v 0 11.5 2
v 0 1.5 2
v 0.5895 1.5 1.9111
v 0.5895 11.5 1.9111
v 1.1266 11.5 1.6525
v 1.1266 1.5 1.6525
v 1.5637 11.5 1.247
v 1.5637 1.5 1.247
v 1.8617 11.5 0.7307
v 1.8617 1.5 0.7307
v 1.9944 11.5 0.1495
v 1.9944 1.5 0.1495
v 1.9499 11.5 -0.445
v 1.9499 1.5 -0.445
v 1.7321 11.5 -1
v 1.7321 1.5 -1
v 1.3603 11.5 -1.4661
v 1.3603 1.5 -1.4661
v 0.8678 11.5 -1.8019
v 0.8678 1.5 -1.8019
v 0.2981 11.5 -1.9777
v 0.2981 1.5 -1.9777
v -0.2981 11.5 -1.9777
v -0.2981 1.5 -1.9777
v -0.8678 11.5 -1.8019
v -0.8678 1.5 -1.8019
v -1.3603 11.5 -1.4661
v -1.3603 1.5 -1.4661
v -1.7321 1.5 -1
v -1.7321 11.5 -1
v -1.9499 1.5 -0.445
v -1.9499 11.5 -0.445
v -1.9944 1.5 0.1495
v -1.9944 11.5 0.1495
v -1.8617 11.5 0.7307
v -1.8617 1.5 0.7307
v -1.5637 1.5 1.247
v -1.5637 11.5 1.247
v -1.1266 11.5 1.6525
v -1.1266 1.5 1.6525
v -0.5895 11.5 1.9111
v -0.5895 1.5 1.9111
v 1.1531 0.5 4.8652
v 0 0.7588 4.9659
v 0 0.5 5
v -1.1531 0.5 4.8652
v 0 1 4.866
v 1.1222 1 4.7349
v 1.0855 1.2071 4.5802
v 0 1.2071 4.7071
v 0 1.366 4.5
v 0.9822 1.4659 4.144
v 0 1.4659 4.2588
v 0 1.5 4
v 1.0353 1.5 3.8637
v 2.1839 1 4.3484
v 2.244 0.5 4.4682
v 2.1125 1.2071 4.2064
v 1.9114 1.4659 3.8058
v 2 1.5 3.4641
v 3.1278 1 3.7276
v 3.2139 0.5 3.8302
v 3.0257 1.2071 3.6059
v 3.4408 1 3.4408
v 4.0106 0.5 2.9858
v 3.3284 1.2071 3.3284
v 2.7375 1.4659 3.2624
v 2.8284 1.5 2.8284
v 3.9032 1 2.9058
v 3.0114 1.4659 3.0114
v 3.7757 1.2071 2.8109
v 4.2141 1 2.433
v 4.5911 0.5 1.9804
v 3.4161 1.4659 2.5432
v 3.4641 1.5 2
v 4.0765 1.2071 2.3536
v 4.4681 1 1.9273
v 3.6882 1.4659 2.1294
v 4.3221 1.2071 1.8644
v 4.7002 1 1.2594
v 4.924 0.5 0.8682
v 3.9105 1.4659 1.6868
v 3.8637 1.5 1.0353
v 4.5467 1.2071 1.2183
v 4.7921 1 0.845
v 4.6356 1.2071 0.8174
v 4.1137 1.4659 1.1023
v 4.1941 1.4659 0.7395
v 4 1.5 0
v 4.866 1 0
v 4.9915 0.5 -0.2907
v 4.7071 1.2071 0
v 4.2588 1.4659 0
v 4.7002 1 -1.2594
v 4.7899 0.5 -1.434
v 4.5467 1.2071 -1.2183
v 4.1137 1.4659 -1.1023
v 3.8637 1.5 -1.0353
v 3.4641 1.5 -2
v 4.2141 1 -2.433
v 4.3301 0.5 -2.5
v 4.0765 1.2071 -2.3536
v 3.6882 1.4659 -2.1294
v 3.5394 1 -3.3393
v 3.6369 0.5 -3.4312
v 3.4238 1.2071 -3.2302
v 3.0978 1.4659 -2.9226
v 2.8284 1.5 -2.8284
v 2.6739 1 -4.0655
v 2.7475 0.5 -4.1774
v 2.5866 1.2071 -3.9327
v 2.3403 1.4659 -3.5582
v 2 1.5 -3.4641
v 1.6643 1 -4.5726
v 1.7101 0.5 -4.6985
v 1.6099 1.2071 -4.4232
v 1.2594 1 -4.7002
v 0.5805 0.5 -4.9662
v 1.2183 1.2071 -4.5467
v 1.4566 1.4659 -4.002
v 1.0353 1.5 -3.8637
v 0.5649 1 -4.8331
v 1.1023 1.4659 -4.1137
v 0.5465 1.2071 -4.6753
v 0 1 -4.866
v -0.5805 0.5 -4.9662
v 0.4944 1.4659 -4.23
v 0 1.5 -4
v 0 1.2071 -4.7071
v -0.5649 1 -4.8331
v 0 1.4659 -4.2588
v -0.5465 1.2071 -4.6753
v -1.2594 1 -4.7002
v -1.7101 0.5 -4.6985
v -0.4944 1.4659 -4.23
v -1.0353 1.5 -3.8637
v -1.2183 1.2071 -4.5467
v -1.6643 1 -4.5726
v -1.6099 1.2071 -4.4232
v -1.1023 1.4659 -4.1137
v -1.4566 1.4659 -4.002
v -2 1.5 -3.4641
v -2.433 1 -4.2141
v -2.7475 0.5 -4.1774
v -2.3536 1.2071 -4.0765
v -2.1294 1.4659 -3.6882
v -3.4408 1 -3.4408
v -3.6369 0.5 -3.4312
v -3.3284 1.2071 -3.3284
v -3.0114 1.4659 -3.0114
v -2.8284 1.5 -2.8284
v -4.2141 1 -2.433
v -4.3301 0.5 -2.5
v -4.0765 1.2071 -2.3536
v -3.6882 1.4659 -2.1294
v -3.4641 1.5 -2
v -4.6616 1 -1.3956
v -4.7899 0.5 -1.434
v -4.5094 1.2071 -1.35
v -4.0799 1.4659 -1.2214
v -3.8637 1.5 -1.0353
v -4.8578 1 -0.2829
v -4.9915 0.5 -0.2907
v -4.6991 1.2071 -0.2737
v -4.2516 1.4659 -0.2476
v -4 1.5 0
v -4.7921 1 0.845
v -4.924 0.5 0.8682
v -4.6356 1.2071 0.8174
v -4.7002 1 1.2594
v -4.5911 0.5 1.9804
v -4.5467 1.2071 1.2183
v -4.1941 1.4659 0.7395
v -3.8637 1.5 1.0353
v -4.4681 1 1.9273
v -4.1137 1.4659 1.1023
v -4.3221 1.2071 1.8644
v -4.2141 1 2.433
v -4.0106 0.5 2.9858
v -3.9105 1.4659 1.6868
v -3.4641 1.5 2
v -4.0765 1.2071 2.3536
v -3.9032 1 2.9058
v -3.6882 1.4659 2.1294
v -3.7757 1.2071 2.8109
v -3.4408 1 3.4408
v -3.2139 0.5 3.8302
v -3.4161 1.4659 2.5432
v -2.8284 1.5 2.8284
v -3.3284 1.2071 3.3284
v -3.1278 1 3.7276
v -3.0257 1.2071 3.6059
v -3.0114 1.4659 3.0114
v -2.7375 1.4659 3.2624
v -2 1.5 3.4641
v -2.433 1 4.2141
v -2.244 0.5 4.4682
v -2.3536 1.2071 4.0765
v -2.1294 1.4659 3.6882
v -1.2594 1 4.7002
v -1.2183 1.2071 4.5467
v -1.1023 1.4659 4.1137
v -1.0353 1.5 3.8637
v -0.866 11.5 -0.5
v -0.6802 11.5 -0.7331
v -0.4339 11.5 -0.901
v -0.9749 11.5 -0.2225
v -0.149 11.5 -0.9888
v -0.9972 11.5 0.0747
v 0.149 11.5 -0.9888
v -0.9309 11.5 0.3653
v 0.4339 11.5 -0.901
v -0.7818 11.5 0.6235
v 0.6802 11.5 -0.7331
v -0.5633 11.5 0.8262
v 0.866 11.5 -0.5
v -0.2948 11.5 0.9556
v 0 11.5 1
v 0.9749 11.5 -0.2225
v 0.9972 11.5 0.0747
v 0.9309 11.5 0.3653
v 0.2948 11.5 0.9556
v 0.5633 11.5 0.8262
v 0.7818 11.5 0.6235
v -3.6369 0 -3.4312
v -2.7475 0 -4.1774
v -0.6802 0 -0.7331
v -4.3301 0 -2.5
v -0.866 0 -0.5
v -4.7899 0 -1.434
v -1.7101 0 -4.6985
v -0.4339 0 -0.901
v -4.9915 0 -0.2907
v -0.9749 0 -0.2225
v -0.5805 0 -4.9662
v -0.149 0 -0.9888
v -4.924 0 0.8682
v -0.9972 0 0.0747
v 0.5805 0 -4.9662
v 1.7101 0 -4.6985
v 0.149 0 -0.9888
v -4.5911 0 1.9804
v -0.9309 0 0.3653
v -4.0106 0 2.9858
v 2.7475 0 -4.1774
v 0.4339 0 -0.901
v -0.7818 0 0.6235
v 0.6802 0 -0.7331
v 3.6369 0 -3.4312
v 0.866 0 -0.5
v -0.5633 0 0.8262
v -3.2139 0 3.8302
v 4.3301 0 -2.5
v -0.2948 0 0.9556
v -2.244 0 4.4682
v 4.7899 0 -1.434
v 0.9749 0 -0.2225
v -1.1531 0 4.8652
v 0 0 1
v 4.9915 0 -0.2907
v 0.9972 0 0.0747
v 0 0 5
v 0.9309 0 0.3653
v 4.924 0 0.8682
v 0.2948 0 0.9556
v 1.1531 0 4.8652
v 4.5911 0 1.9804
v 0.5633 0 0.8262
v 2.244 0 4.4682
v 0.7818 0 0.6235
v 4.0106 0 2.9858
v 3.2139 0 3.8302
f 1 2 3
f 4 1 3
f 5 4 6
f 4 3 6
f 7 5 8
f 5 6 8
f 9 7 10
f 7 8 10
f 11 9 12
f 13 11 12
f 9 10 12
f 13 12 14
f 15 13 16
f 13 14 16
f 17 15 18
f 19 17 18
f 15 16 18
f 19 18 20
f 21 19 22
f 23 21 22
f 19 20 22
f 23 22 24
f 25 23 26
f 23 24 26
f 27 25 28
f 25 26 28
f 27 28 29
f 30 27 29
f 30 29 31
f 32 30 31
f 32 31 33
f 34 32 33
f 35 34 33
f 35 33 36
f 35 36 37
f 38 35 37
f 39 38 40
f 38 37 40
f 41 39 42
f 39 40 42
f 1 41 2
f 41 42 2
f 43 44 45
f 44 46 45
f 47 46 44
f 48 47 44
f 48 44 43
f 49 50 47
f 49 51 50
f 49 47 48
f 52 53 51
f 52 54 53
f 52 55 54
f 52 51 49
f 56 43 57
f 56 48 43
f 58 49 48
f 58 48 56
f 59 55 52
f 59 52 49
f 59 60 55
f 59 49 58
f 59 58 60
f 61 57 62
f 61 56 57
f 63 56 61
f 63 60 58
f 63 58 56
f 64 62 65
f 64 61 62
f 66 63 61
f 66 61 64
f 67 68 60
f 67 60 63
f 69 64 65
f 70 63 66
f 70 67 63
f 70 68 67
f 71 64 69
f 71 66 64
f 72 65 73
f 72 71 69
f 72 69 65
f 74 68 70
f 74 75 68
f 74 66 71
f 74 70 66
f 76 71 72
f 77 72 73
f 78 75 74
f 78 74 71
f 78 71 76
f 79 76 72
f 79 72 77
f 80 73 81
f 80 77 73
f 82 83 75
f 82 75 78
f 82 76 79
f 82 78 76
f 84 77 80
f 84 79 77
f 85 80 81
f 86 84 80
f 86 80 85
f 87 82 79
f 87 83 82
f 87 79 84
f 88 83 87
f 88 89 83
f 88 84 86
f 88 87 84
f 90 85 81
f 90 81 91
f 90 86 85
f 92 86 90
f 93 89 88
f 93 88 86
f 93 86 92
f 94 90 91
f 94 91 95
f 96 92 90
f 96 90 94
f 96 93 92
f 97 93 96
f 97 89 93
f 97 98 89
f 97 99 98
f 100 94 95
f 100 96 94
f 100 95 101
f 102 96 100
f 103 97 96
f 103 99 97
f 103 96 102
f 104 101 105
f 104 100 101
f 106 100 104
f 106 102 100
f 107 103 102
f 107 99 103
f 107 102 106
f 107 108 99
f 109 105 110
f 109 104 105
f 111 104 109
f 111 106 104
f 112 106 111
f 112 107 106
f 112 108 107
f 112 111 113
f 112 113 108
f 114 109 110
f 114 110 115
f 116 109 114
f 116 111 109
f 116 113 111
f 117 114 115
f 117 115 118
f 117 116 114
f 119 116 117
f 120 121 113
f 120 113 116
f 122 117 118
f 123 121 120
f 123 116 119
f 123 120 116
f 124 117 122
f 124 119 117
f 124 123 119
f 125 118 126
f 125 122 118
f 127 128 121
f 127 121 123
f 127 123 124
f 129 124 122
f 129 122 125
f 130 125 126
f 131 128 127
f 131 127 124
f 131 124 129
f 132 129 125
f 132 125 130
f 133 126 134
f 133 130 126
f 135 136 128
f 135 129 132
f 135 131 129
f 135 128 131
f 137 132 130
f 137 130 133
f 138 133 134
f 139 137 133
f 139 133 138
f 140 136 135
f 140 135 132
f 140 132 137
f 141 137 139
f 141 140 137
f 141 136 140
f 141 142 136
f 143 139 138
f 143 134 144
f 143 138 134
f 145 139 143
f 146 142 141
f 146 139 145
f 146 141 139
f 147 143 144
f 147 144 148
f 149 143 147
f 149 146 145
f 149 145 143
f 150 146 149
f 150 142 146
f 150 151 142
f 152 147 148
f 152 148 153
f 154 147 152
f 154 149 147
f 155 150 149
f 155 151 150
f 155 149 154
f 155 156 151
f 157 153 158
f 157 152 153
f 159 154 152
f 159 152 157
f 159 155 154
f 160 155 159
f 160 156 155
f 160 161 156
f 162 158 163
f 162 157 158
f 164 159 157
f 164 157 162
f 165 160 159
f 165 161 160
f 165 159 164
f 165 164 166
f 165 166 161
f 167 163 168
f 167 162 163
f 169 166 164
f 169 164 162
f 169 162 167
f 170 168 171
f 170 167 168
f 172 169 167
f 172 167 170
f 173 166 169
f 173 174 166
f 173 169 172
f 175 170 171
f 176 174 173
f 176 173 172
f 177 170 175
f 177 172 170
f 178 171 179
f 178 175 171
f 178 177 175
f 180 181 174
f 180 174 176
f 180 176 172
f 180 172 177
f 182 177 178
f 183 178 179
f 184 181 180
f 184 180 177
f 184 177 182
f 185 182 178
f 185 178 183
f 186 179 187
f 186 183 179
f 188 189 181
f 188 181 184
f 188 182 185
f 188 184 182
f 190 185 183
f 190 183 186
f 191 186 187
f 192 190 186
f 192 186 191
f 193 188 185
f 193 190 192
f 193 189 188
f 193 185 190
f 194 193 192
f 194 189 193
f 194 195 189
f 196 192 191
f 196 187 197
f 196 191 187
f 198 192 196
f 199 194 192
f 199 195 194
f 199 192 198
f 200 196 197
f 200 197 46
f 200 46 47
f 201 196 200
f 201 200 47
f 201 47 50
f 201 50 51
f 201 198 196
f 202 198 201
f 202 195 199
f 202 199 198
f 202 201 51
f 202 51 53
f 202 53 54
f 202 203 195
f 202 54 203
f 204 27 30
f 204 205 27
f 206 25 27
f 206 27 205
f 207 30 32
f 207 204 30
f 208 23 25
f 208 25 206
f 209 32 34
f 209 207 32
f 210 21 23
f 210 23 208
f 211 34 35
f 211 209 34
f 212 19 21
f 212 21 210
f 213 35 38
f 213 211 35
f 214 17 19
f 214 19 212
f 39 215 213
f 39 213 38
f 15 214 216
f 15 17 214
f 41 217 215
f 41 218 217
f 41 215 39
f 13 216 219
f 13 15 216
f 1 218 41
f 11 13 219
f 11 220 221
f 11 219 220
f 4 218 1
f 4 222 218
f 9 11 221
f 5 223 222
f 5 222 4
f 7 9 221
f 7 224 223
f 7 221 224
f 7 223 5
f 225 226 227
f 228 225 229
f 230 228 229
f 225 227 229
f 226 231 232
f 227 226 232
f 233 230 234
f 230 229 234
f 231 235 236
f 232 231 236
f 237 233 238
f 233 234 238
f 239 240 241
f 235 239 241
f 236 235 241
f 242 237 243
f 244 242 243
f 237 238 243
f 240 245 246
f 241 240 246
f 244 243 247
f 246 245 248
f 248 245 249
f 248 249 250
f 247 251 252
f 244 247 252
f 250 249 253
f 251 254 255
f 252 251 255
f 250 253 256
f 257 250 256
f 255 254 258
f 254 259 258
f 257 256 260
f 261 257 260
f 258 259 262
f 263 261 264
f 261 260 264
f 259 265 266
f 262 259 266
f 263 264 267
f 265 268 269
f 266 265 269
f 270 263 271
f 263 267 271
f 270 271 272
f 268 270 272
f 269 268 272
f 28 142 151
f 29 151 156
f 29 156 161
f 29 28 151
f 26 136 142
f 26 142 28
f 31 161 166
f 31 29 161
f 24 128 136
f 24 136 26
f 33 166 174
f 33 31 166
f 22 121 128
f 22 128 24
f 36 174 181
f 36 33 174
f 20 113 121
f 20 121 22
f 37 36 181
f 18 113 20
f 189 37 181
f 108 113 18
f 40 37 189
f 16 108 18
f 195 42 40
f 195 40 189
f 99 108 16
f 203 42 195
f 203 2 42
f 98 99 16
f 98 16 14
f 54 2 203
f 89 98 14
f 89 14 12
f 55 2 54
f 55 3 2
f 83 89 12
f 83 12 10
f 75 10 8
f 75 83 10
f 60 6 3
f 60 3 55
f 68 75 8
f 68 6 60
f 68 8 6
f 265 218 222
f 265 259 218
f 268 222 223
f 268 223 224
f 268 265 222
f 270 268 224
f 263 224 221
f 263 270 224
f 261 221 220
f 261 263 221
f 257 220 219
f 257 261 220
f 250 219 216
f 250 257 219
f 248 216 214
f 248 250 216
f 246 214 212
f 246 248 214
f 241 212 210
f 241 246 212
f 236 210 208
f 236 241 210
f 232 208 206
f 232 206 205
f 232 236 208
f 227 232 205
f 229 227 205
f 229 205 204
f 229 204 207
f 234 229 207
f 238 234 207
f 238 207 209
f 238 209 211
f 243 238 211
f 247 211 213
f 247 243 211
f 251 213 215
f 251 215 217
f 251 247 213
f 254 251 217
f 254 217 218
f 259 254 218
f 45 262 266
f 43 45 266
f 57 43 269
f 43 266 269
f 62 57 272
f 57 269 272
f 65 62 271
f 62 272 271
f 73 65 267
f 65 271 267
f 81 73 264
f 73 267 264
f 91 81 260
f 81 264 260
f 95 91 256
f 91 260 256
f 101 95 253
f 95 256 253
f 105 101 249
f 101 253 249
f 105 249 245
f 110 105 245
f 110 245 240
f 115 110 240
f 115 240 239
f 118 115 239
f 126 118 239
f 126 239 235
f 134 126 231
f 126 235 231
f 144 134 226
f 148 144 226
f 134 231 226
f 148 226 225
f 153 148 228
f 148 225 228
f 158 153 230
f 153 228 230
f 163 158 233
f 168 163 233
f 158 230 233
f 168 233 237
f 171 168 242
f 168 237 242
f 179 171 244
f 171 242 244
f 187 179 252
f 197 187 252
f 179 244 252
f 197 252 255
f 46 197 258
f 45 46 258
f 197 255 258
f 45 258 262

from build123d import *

# Parameters (mm, degrees)
SKETCH_1_R      = 5
SKETCH_1_R_2    = 1
EXTRUDE_1_DEPTH = 1.5
FILLET_1_R      = 1
SKETCH_2_R      = 2
SKETCH_2_R_2    = 1
EXTRUDE_2_DEPTH = 10


with BuildPart() as part:
    # Эскиз1 → Бобышка-Вытянуть1 (new body)
    with BuildSketch(Plane(origin=(0, 0, 0), x_dir=(1, 0, 0), z_dir=(0, 1, 0))):
        with Locations(Location((0, 0, 0), (0, 0, 270))):
            Circle(SKETCH_1_R)
        with Locations(Location((0, 0, 0), (0, 0, 270))):
            Circle(SKETCH_1_R_2, mode=Mode.SUBTRACT)
    extrude(amount=EXTRUDE_1_DEPTH)

    # Скругление1
    fillet_1_edges = [part.edges().sort_by_distance(p)[0] for p in [
        (0, 1.5, -5),
    ]]
    fillet(fillet_1_edges, radius=FILLET_1_R)

    # Эскиз2 → Бобышка-Вытянуть2 (add)
    with BuildSketch(Plane(origin=(0, 1.5, 0), x_dir=(1, 0, 0), z_dir=(0, 1, 0))):
        with Locations(Location((0, 0, 0), (0, 0, 270))):
            Circle(SKETCH_2_R)
        with Locations(Location((0, 0, 0), (0, 0, 270))):
            Circle(SKETCH_2_R_2, mode=Mode.SUBTRACT)
    extrude(amount=EXTRUDE_2_DEPTH)


solid = part.part
